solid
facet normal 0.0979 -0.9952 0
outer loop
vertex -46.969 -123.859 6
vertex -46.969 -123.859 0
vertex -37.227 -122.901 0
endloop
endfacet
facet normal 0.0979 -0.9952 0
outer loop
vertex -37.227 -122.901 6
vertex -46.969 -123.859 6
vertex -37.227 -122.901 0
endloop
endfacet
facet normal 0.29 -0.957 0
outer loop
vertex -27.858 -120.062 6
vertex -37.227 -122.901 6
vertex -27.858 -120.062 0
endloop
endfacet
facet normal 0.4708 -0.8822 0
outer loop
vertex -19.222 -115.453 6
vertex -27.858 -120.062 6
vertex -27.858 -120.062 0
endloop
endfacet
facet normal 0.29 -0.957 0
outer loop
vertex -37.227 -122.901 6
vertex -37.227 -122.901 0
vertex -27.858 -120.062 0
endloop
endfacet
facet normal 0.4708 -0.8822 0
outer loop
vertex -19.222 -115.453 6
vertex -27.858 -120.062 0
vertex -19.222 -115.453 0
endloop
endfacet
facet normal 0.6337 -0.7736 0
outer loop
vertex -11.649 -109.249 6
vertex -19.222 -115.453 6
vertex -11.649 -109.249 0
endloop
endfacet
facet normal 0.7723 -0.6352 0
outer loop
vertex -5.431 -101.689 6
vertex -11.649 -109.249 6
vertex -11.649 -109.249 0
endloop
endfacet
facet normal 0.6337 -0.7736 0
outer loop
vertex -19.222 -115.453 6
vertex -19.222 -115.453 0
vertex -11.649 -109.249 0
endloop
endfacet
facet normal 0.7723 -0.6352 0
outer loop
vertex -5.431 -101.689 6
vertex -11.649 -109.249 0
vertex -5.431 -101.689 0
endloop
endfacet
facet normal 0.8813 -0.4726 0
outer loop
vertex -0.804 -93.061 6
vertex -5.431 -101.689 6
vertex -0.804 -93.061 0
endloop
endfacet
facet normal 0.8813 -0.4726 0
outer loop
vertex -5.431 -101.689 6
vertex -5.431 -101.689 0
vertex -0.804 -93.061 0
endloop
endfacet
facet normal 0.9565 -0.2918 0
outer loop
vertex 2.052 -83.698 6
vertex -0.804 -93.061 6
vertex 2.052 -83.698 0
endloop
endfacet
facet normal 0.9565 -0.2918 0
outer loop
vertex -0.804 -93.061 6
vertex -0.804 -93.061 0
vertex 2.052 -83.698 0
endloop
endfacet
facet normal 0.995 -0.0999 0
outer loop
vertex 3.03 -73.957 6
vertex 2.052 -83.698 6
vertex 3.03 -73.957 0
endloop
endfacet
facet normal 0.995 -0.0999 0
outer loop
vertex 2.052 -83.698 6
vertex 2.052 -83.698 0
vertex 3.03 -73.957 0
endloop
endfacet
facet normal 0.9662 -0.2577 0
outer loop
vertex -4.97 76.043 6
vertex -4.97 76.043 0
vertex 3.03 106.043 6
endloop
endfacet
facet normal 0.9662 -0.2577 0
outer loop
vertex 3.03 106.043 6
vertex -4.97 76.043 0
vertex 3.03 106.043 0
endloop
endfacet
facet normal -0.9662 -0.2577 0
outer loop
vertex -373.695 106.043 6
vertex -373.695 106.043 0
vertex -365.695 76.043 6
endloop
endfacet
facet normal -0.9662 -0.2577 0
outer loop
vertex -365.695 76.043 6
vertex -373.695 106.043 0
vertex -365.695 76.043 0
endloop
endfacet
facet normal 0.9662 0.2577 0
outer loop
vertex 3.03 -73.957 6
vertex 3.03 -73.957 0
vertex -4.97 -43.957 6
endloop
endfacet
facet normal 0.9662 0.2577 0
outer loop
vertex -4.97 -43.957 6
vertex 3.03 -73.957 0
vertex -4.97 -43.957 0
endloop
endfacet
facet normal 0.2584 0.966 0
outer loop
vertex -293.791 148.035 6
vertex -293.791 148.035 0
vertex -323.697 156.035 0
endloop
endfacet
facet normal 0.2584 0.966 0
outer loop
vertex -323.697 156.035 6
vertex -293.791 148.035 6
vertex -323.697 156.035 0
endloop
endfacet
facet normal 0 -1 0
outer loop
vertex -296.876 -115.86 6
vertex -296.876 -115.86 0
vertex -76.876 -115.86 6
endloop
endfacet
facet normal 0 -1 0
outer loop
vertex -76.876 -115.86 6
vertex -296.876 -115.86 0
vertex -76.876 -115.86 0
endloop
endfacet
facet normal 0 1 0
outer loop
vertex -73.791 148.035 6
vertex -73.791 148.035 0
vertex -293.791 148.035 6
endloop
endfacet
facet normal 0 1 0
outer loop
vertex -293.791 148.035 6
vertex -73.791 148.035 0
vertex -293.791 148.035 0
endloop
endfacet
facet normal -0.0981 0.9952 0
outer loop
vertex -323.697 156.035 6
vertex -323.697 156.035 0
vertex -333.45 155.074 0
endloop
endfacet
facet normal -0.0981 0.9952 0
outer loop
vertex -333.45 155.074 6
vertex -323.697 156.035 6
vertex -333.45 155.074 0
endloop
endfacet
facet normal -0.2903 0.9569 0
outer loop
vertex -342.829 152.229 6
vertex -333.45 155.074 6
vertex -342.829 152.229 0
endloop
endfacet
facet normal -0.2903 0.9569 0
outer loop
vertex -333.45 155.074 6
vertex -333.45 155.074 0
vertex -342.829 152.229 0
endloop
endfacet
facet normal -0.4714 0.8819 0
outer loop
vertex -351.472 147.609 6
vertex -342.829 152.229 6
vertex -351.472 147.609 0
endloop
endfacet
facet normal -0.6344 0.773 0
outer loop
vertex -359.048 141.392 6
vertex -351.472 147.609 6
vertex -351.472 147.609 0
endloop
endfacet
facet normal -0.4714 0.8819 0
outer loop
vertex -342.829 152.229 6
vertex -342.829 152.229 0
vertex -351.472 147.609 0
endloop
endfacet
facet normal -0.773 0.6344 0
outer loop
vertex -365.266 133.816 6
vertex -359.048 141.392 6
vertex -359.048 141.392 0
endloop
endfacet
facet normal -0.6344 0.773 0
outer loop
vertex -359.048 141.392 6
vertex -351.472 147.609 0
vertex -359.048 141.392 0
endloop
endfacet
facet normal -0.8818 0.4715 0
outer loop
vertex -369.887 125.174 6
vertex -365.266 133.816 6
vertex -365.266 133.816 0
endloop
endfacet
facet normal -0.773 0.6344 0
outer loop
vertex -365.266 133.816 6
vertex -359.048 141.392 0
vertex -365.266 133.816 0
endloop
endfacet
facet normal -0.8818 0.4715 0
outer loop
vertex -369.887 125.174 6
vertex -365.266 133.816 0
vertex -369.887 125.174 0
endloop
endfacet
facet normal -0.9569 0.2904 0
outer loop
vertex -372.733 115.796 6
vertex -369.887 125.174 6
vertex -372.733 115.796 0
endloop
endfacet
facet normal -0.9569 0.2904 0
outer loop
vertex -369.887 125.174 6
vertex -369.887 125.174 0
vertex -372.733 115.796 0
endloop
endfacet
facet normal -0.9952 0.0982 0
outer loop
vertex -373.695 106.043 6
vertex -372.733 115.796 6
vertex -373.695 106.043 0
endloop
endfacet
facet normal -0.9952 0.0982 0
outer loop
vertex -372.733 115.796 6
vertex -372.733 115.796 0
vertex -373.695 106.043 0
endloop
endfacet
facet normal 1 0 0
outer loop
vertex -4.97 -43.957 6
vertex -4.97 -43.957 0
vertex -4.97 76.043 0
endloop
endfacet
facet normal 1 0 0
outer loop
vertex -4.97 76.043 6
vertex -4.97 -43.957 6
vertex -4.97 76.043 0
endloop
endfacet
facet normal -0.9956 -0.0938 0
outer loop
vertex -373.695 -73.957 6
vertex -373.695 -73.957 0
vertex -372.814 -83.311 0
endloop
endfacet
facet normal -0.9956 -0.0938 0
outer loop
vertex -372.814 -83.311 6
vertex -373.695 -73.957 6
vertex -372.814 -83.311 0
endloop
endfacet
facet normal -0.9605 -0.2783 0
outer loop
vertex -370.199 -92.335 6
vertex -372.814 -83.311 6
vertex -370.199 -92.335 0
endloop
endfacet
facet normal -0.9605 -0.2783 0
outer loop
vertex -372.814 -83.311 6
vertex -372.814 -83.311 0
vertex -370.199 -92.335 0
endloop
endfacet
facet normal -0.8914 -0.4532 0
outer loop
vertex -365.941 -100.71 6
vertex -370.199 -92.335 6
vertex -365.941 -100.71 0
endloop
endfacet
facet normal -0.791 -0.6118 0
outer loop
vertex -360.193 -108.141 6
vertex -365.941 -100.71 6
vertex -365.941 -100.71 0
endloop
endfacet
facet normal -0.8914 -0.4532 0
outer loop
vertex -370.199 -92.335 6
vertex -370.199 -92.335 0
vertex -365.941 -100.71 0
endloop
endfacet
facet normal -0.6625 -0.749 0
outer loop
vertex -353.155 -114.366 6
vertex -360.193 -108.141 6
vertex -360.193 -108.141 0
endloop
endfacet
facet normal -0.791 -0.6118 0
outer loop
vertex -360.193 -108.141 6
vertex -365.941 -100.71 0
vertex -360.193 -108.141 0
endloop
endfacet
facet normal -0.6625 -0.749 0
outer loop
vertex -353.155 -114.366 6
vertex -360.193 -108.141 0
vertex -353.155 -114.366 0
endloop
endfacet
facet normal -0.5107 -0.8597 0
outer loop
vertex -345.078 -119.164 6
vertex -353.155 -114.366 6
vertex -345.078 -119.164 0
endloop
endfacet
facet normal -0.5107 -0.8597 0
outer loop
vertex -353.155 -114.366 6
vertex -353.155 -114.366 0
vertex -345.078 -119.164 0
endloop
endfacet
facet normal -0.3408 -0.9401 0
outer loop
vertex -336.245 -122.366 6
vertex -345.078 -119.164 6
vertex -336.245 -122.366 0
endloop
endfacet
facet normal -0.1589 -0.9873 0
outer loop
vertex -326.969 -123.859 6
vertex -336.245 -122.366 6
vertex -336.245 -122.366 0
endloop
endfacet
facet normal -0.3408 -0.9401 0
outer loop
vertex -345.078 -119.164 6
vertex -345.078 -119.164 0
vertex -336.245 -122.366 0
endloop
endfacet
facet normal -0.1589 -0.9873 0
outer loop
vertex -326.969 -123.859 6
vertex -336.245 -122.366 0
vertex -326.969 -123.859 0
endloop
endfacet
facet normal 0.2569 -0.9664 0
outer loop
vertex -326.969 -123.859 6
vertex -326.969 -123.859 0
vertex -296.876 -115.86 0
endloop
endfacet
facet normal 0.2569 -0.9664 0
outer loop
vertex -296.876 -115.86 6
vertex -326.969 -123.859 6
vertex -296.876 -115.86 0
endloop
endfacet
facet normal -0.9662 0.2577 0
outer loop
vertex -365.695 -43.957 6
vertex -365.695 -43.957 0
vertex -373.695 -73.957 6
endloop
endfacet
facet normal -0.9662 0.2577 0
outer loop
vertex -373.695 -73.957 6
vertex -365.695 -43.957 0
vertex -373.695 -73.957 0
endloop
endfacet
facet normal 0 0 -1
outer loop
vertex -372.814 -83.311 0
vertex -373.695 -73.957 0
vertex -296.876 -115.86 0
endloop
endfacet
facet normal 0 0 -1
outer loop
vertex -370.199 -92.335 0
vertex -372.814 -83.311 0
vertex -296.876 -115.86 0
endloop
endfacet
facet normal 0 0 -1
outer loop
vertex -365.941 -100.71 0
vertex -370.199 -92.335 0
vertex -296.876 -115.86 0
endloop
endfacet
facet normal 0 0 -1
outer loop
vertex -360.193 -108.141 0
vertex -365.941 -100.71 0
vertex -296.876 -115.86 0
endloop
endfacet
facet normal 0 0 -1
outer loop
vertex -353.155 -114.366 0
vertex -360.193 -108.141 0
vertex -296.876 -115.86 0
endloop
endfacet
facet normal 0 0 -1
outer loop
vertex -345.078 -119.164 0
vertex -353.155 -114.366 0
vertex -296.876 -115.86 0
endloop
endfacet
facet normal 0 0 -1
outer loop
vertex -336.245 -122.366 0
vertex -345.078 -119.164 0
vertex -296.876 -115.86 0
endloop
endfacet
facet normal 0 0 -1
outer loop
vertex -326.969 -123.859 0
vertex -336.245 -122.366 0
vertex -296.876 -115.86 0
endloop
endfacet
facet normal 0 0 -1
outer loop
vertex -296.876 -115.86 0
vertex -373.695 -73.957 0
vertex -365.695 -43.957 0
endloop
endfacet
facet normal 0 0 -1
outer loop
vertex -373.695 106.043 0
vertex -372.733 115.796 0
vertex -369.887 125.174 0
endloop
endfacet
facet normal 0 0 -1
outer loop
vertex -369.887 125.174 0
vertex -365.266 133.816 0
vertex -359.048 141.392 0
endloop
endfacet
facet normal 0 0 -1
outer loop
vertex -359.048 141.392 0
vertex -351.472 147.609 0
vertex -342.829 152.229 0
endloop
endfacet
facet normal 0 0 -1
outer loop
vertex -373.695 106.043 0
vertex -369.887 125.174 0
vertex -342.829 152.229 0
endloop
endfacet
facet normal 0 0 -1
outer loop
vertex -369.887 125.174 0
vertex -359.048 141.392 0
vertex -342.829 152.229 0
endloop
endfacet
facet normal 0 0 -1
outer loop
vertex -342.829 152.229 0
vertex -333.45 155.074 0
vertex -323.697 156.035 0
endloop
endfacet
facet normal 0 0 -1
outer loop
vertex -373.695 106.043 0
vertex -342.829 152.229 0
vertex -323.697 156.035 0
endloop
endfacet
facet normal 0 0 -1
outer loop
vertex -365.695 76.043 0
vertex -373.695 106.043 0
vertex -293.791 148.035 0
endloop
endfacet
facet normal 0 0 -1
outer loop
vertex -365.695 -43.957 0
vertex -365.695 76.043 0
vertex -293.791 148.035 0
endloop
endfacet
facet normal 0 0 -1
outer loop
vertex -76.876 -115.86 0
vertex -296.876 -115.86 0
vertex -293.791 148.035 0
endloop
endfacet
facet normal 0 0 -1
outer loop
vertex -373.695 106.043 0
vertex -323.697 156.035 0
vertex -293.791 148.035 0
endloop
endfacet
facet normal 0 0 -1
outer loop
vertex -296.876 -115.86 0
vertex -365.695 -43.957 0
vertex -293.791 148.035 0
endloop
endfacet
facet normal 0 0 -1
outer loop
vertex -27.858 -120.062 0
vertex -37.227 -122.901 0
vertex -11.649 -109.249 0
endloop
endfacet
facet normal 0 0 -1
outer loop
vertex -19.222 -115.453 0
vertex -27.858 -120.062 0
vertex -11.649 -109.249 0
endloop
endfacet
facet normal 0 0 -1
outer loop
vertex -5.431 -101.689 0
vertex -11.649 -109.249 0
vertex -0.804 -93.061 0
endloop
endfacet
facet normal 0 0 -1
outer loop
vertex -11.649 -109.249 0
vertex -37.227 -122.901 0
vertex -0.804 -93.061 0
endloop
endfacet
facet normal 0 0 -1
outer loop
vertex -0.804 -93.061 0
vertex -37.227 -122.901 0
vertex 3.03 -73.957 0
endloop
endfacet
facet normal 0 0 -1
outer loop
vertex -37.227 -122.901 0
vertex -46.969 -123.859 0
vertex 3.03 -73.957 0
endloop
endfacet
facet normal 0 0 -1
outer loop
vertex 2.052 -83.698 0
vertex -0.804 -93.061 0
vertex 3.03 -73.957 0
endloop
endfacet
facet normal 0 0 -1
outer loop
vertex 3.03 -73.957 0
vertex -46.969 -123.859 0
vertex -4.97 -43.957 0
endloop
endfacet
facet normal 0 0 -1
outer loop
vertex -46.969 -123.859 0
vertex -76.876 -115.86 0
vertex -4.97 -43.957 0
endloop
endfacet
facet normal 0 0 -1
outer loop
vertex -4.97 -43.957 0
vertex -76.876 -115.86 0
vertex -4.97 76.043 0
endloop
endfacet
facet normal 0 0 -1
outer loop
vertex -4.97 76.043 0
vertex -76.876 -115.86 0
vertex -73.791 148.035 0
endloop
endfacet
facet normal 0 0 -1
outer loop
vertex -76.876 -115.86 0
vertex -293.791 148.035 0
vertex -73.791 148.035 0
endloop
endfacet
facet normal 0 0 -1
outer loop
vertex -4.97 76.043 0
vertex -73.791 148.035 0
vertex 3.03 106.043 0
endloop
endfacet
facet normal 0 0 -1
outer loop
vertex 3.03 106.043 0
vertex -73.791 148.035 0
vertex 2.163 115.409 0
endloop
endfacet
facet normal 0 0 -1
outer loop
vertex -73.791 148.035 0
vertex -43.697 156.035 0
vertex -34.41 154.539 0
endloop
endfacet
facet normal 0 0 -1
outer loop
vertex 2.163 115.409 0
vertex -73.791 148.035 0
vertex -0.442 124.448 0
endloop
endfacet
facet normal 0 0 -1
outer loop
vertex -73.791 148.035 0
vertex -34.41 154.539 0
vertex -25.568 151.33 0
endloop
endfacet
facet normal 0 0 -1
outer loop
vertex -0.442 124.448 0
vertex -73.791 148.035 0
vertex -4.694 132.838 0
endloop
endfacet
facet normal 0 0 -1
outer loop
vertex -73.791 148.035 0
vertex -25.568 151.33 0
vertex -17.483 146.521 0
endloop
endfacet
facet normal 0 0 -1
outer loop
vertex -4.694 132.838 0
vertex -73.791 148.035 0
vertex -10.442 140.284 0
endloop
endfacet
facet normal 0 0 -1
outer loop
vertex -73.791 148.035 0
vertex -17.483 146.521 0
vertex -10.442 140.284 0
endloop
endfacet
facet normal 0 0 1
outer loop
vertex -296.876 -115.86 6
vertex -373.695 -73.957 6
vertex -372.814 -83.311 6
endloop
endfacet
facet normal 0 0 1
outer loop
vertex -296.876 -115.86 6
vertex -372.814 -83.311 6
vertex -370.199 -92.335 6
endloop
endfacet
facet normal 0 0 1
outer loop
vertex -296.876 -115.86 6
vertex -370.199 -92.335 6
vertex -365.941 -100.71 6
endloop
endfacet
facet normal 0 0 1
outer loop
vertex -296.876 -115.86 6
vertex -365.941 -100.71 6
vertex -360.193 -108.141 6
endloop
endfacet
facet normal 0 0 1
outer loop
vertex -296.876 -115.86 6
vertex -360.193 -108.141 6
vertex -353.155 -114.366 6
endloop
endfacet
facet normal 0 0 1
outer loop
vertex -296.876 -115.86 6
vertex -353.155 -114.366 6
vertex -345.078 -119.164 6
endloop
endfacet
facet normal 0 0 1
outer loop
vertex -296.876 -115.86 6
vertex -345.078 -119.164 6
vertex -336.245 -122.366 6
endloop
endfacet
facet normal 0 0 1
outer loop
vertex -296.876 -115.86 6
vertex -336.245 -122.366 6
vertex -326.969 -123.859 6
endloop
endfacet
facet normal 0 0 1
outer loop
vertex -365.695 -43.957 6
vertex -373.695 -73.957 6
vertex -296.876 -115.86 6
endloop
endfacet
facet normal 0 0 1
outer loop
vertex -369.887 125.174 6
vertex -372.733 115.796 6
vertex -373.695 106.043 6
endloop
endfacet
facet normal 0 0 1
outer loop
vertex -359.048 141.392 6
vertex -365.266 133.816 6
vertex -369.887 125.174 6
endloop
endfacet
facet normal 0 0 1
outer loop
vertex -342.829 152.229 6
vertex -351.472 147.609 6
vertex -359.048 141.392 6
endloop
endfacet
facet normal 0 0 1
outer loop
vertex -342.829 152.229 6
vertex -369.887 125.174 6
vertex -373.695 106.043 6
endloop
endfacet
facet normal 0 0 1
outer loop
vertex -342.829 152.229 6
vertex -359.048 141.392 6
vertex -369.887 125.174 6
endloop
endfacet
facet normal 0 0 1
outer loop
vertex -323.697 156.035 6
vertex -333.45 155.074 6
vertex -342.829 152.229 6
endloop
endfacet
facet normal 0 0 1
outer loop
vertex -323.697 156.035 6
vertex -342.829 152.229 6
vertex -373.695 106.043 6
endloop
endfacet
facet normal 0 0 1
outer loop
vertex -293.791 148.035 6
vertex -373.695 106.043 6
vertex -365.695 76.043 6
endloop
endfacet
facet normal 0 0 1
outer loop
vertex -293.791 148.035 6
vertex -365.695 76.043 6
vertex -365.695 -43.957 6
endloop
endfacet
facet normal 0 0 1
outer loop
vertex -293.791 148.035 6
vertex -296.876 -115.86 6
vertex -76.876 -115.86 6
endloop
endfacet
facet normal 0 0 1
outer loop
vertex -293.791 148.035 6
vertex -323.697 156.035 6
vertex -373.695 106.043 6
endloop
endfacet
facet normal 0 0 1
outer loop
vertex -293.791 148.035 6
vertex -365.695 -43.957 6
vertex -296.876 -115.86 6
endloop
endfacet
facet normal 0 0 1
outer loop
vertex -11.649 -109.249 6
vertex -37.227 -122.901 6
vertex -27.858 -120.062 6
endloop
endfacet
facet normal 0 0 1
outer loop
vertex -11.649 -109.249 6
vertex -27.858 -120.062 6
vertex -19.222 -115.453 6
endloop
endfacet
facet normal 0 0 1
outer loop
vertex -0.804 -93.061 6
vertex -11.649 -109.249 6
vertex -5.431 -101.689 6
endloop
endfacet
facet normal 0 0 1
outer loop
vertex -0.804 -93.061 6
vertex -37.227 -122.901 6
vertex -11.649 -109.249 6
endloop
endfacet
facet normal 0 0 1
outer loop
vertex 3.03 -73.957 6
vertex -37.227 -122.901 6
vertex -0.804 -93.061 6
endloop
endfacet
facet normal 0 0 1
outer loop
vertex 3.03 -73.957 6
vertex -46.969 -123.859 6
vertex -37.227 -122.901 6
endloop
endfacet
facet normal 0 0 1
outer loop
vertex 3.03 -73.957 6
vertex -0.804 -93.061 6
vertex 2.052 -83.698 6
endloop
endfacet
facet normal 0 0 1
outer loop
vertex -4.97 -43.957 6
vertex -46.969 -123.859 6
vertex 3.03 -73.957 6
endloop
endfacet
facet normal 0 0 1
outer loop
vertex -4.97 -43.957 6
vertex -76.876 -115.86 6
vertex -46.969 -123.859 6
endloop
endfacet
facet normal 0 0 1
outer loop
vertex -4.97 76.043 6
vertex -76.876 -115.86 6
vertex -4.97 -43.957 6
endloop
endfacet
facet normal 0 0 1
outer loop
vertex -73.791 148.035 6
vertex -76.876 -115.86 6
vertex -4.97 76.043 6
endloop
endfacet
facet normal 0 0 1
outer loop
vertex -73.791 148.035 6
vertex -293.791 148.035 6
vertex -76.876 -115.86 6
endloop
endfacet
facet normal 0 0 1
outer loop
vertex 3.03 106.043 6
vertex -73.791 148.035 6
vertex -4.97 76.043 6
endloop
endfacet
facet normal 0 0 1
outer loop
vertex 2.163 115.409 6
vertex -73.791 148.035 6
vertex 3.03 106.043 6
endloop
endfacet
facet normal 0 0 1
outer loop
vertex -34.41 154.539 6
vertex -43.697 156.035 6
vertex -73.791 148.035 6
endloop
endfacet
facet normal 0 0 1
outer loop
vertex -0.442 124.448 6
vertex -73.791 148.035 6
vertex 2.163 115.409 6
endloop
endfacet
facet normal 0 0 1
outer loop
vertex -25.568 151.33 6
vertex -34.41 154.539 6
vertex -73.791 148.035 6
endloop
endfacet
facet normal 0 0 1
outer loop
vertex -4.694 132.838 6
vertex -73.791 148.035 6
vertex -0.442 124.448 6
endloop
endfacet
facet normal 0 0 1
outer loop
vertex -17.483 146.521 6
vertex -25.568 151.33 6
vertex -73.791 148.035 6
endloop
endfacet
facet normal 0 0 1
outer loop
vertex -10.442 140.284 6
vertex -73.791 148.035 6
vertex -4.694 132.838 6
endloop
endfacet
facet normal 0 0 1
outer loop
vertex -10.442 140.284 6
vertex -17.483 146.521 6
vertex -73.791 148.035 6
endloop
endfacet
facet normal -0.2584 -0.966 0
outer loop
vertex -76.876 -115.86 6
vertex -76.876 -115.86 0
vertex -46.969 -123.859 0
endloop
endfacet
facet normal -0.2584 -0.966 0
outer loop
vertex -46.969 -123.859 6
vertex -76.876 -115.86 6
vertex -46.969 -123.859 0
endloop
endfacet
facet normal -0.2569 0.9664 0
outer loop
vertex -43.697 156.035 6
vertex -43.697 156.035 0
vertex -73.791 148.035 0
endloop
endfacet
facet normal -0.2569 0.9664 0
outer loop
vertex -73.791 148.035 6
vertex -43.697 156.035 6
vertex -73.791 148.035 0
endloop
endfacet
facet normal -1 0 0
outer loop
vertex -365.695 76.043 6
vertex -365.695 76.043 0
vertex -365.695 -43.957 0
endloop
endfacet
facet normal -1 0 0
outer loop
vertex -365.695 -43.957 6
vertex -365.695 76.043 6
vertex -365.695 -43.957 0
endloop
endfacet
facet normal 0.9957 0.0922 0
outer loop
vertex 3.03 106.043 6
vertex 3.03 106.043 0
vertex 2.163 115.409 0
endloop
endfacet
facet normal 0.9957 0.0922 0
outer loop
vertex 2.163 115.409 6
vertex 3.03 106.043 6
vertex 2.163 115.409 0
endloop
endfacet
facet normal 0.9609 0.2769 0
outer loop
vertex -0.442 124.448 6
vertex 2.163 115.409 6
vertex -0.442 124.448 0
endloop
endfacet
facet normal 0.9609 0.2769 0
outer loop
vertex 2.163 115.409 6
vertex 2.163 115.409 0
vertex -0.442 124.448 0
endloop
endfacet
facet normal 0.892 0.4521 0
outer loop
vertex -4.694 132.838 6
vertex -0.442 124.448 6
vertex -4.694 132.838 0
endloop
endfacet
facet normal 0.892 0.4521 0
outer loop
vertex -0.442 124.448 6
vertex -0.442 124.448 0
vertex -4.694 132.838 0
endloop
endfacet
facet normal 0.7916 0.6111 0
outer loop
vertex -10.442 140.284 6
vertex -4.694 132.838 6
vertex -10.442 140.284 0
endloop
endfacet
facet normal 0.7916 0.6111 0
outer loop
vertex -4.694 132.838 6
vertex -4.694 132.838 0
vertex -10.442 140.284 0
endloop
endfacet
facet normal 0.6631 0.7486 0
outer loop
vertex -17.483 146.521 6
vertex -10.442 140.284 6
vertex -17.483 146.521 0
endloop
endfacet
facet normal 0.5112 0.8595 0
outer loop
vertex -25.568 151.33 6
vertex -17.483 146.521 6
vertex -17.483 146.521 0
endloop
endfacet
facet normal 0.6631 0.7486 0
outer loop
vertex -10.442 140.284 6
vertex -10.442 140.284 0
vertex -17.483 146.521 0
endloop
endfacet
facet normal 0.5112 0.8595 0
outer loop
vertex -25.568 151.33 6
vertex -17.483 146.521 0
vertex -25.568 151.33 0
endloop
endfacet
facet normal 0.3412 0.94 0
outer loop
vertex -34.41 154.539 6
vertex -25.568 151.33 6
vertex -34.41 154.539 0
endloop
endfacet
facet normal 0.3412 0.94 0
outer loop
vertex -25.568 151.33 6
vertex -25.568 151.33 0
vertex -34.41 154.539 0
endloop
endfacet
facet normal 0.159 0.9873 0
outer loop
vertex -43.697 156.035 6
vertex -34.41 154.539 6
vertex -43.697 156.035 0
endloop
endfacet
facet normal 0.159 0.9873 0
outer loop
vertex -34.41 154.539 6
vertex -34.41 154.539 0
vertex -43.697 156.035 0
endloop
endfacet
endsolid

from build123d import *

# Parameters (mm, degrees)
BOSS_EXTRU_1_DEPTH = 6


with BuildPart() as part:
    # Esquisse1 → Boss.-Extru.1 (new body)
    with BuildSketch(Plane.XY):
        with BuildLine():
            Line((-373.69467463, 106.042558597), (-365.69467463, 76.042558597))
            Line((-365.69467463, 76.042558597), (-365.69467463, -43.957441403))
            Line((-365.69467463, -43.957441403), (-373.69467463, -73.957441403))
            ThreePointArc((-373.69467463, -73.957441403), (-360.192601556, -108.141248671), (-326.969404712, -123.859322601))
            Line((-326.969404712, -123.859322601), (-296.875879039, -115.85986931))
            Line((-296.875879039, -115.85986931), (-76.875879039, -115.85986931))
            Line((-76.875879039, -115.85986931), (-46.969404712, -123.859322601))
            ThreePointArc((-46.969404712, -123.859322601), (-11.649350298, -109.24901926), (3.029605382, -73.957441403))
            Line((3.029605382, -73.957441403), (-4.970394618, -43.957441403))
            Line((-4.970394618, -43.957441403), (-4.970394618, 76.042558597))
            Line((-4.970394618, 76.042558597), (3.029605382, 106.042558597))
            ThreePointArc((3.029605382, 106.042558597), (-10.442134726, 140.284021287), (-43.697023707, 156.03451041))
            Line((-43.697023707, 156.03451041), (-73.79054938, 148.035057119))
            Line((-73.79054938, 148.035057119), (-293.79054938, 148.035057119))
            Line((-293.79054938, 148.035057119), (-323.697023707, 156.03451041))
            ThreePointArc((-323.697023707, 156.03451041), (-359.04799913, 141.391864616), (-373.69467463, 106.042558597))
        make_face()
    extrude(amount=BOSS_EXTRU_1_DEPTH)


solid = part.part
